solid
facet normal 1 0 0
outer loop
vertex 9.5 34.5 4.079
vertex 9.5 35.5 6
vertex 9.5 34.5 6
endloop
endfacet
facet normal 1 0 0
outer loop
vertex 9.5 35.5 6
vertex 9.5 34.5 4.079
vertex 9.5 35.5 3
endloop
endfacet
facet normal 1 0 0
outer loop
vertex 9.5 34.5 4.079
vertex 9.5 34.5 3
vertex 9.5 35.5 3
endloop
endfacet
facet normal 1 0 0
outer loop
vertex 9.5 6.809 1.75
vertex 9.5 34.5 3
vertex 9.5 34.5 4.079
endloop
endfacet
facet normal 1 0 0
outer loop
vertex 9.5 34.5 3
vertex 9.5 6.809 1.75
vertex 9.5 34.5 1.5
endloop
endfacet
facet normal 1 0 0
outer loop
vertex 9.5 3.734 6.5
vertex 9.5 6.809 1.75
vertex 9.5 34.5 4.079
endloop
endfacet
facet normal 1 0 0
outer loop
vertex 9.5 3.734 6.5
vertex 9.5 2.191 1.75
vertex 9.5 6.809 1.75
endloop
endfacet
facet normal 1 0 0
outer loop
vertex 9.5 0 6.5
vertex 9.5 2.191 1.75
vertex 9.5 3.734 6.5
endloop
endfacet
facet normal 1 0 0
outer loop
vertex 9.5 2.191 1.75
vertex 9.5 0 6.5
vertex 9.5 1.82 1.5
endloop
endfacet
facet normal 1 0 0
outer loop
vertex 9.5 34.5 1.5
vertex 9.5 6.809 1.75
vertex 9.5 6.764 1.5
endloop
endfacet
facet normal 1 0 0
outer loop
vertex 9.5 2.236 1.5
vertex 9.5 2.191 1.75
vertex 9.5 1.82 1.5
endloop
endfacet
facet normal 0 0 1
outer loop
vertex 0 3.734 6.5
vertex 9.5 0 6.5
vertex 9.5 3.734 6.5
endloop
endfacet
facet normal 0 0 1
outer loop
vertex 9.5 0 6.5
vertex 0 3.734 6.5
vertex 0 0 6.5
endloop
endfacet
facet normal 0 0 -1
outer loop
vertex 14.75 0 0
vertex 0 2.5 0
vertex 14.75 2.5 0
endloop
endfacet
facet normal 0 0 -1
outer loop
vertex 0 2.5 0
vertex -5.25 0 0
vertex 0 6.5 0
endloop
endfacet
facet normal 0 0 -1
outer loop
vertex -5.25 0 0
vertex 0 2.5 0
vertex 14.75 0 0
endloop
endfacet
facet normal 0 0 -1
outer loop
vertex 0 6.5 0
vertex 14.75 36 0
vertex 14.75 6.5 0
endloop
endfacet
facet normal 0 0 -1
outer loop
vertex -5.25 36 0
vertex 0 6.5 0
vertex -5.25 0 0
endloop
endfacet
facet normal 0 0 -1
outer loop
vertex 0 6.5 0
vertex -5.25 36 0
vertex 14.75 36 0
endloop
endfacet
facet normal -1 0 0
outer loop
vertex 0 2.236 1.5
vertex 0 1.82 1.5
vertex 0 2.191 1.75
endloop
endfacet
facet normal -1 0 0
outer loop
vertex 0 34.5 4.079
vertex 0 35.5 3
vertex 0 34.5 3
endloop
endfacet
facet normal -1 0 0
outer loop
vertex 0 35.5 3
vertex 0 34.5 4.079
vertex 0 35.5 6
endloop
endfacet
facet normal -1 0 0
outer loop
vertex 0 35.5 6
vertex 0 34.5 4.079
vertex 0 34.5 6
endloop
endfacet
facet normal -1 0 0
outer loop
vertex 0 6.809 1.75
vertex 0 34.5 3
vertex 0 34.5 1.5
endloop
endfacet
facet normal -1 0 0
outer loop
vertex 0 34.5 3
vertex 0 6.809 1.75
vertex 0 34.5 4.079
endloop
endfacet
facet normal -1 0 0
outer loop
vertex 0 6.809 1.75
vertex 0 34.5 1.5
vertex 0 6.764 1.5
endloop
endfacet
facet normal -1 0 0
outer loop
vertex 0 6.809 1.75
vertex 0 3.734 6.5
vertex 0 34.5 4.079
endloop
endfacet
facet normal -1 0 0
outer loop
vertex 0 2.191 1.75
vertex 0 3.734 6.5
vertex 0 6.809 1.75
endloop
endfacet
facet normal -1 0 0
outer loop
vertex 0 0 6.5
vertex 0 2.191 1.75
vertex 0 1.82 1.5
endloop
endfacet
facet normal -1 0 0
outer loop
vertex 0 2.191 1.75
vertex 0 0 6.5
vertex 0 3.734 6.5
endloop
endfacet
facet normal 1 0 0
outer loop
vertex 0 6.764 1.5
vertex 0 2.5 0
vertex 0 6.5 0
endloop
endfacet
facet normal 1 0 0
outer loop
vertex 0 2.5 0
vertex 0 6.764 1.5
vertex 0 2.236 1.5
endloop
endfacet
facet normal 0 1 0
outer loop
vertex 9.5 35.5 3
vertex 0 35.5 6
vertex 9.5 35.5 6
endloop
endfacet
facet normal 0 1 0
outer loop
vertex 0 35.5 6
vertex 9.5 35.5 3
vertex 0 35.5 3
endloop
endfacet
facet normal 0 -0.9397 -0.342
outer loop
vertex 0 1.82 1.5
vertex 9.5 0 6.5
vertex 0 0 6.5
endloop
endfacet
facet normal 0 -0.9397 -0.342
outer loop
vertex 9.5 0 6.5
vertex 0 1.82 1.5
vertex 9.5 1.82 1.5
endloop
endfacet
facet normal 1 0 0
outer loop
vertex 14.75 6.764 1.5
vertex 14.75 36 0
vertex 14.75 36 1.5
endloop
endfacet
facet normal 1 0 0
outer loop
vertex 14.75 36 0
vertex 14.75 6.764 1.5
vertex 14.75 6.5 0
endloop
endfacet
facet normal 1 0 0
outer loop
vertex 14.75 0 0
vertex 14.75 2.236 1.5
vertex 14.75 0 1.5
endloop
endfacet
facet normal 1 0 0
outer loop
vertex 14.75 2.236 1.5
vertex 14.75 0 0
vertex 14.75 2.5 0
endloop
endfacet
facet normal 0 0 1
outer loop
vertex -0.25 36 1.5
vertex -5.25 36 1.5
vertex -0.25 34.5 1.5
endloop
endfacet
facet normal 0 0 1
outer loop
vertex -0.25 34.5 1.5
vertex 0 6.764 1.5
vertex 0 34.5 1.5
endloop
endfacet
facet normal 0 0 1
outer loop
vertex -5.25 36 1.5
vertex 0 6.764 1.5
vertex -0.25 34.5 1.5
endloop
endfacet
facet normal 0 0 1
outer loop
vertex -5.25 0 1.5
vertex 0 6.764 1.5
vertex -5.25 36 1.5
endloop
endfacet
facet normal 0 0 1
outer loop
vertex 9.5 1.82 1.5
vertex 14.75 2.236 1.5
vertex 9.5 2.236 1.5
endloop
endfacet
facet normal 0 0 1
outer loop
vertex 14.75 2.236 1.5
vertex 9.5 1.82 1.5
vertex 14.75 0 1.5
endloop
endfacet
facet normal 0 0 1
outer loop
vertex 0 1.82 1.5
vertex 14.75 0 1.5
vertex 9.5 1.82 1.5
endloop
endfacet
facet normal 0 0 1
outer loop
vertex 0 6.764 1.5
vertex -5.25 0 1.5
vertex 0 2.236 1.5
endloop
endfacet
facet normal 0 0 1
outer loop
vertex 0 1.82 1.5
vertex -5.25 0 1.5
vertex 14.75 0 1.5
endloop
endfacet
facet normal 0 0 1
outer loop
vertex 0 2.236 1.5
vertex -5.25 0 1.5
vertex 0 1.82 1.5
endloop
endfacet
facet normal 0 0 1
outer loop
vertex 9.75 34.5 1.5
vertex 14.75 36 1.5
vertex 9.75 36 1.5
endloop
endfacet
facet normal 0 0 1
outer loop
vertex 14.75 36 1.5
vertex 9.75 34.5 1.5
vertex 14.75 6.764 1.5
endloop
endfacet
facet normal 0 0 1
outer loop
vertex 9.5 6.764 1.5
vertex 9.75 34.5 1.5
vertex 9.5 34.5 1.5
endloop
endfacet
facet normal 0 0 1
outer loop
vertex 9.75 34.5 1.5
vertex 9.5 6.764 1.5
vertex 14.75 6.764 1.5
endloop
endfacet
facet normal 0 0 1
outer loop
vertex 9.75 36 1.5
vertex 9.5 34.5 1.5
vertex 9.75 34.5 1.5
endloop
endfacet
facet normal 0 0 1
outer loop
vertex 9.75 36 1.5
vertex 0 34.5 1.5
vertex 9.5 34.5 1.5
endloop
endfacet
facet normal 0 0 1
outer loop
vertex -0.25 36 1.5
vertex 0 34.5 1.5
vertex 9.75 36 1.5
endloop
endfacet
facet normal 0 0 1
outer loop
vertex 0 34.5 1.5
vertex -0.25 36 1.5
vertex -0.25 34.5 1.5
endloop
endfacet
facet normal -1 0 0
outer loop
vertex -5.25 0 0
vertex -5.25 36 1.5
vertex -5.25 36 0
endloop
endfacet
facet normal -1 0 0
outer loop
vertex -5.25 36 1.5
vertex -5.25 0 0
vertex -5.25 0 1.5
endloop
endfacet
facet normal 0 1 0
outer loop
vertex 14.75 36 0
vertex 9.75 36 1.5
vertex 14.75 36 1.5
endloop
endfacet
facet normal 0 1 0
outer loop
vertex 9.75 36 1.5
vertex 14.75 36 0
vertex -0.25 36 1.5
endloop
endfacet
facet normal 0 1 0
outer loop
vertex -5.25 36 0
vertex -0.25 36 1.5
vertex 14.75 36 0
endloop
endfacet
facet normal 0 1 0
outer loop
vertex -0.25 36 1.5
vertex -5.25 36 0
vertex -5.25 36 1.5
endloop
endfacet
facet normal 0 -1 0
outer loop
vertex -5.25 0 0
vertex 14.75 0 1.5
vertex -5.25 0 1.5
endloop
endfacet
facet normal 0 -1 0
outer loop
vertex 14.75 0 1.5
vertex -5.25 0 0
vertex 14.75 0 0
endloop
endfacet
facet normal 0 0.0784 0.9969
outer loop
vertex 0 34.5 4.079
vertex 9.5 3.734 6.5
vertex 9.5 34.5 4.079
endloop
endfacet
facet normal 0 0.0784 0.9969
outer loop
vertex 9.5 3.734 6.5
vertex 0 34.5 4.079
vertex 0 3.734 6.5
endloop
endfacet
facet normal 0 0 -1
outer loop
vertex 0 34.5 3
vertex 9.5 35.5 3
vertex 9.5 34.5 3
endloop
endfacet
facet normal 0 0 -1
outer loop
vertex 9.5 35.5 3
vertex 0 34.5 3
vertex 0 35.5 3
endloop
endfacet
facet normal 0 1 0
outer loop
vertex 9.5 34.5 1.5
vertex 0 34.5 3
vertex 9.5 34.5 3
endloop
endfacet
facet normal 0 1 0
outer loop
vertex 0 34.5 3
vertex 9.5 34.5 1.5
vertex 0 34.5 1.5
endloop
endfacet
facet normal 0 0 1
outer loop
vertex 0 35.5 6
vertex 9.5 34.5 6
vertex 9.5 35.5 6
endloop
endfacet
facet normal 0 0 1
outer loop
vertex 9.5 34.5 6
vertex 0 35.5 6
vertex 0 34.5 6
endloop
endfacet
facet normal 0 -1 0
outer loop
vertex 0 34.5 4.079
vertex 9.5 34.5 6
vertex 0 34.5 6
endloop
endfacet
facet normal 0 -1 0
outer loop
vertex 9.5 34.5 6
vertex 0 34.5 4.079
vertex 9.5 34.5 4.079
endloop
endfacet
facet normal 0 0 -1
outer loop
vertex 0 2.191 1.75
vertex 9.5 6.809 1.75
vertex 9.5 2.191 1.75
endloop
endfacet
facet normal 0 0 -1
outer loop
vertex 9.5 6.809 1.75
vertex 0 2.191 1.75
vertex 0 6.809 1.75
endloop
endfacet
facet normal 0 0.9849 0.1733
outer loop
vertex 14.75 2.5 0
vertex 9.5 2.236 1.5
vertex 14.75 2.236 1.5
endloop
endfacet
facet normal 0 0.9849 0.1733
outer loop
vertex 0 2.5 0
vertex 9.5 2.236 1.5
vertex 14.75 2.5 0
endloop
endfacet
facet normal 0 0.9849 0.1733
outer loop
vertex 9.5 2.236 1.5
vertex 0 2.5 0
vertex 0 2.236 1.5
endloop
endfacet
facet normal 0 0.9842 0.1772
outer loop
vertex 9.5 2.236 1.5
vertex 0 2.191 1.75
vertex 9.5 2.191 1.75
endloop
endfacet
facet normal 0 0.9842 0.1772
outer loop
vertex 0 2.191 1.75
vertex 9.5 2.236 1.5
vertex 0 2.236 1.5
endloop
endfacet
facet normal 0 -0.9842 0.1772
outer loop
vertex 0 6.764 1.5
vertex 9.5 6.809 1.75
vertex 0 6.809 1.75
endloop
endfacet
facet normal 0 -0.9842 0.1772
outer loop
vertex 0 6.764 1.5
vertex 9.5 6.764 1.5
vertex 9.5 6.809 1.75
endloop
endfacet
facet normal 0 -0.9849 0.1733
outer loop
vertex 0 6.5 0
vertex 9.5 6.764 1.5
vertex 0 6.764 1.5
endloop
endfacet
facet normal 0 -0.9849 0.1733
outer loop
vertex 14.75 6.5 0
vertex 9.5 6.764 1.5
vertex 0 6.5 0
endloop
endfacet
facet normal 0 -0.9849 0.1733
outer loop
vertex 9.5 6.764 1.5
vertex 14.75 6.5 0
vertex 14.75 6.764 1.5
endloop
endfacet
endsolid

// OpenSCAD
$fn = 120;

difference() {
	union() {
		difference() {
			union() {
				difference() {
					cube(size = [9.5, 35.5, 6.5]);
					translate(v = [0, 0, 6.5]) {
						rotate(a = [20, 0, 0]) {
							translate(v = [-0.25, -7.2, -6.5]) {
								cube(size = [10, 7.2, 6.5]);
							}
						}
					}
				}
				translate(v = [-5.25, 0, 0]) {
					cube(size = [20, 36, 1.5]);
				}
			}
			translate(v = [-0.25, 35.5, 4.0]) {
				rotate(a = [-4.5, 0, 0]) {
					translate(v = [0, -35.5, 0]) {
						cube(size = [10, 35.5, 5]);
					}
				}
			}
			translate(v = [-0.25, 34.5, 1.5]) {
				cube(size = [10, 1.5, 1.5]);
			}
		}
		translate(v = [0, 34.5, 3.0]) {
			cube(size = [9.5, 1.0, 3.0]);
		}
	}
	translate(v = [0, 2.5, 0]) {
		difference() {
			translate(v = [0, -1, -0.25]) {
				cube(size = [15, 6, 2.0]);
			}
			rotate(a = [10, 0, 0]) {
				translate(v = [-0.25, -2, 0]) {
					cube(size = [15.5, 2, 2]);
				}
			}
			translate(v = [-0.25, 4, 0]) {
				rotate(a = [-10, 0, 0]) {
					cube(size = [15.5, 2, 2]);
				}
			}
		}
	}
}
